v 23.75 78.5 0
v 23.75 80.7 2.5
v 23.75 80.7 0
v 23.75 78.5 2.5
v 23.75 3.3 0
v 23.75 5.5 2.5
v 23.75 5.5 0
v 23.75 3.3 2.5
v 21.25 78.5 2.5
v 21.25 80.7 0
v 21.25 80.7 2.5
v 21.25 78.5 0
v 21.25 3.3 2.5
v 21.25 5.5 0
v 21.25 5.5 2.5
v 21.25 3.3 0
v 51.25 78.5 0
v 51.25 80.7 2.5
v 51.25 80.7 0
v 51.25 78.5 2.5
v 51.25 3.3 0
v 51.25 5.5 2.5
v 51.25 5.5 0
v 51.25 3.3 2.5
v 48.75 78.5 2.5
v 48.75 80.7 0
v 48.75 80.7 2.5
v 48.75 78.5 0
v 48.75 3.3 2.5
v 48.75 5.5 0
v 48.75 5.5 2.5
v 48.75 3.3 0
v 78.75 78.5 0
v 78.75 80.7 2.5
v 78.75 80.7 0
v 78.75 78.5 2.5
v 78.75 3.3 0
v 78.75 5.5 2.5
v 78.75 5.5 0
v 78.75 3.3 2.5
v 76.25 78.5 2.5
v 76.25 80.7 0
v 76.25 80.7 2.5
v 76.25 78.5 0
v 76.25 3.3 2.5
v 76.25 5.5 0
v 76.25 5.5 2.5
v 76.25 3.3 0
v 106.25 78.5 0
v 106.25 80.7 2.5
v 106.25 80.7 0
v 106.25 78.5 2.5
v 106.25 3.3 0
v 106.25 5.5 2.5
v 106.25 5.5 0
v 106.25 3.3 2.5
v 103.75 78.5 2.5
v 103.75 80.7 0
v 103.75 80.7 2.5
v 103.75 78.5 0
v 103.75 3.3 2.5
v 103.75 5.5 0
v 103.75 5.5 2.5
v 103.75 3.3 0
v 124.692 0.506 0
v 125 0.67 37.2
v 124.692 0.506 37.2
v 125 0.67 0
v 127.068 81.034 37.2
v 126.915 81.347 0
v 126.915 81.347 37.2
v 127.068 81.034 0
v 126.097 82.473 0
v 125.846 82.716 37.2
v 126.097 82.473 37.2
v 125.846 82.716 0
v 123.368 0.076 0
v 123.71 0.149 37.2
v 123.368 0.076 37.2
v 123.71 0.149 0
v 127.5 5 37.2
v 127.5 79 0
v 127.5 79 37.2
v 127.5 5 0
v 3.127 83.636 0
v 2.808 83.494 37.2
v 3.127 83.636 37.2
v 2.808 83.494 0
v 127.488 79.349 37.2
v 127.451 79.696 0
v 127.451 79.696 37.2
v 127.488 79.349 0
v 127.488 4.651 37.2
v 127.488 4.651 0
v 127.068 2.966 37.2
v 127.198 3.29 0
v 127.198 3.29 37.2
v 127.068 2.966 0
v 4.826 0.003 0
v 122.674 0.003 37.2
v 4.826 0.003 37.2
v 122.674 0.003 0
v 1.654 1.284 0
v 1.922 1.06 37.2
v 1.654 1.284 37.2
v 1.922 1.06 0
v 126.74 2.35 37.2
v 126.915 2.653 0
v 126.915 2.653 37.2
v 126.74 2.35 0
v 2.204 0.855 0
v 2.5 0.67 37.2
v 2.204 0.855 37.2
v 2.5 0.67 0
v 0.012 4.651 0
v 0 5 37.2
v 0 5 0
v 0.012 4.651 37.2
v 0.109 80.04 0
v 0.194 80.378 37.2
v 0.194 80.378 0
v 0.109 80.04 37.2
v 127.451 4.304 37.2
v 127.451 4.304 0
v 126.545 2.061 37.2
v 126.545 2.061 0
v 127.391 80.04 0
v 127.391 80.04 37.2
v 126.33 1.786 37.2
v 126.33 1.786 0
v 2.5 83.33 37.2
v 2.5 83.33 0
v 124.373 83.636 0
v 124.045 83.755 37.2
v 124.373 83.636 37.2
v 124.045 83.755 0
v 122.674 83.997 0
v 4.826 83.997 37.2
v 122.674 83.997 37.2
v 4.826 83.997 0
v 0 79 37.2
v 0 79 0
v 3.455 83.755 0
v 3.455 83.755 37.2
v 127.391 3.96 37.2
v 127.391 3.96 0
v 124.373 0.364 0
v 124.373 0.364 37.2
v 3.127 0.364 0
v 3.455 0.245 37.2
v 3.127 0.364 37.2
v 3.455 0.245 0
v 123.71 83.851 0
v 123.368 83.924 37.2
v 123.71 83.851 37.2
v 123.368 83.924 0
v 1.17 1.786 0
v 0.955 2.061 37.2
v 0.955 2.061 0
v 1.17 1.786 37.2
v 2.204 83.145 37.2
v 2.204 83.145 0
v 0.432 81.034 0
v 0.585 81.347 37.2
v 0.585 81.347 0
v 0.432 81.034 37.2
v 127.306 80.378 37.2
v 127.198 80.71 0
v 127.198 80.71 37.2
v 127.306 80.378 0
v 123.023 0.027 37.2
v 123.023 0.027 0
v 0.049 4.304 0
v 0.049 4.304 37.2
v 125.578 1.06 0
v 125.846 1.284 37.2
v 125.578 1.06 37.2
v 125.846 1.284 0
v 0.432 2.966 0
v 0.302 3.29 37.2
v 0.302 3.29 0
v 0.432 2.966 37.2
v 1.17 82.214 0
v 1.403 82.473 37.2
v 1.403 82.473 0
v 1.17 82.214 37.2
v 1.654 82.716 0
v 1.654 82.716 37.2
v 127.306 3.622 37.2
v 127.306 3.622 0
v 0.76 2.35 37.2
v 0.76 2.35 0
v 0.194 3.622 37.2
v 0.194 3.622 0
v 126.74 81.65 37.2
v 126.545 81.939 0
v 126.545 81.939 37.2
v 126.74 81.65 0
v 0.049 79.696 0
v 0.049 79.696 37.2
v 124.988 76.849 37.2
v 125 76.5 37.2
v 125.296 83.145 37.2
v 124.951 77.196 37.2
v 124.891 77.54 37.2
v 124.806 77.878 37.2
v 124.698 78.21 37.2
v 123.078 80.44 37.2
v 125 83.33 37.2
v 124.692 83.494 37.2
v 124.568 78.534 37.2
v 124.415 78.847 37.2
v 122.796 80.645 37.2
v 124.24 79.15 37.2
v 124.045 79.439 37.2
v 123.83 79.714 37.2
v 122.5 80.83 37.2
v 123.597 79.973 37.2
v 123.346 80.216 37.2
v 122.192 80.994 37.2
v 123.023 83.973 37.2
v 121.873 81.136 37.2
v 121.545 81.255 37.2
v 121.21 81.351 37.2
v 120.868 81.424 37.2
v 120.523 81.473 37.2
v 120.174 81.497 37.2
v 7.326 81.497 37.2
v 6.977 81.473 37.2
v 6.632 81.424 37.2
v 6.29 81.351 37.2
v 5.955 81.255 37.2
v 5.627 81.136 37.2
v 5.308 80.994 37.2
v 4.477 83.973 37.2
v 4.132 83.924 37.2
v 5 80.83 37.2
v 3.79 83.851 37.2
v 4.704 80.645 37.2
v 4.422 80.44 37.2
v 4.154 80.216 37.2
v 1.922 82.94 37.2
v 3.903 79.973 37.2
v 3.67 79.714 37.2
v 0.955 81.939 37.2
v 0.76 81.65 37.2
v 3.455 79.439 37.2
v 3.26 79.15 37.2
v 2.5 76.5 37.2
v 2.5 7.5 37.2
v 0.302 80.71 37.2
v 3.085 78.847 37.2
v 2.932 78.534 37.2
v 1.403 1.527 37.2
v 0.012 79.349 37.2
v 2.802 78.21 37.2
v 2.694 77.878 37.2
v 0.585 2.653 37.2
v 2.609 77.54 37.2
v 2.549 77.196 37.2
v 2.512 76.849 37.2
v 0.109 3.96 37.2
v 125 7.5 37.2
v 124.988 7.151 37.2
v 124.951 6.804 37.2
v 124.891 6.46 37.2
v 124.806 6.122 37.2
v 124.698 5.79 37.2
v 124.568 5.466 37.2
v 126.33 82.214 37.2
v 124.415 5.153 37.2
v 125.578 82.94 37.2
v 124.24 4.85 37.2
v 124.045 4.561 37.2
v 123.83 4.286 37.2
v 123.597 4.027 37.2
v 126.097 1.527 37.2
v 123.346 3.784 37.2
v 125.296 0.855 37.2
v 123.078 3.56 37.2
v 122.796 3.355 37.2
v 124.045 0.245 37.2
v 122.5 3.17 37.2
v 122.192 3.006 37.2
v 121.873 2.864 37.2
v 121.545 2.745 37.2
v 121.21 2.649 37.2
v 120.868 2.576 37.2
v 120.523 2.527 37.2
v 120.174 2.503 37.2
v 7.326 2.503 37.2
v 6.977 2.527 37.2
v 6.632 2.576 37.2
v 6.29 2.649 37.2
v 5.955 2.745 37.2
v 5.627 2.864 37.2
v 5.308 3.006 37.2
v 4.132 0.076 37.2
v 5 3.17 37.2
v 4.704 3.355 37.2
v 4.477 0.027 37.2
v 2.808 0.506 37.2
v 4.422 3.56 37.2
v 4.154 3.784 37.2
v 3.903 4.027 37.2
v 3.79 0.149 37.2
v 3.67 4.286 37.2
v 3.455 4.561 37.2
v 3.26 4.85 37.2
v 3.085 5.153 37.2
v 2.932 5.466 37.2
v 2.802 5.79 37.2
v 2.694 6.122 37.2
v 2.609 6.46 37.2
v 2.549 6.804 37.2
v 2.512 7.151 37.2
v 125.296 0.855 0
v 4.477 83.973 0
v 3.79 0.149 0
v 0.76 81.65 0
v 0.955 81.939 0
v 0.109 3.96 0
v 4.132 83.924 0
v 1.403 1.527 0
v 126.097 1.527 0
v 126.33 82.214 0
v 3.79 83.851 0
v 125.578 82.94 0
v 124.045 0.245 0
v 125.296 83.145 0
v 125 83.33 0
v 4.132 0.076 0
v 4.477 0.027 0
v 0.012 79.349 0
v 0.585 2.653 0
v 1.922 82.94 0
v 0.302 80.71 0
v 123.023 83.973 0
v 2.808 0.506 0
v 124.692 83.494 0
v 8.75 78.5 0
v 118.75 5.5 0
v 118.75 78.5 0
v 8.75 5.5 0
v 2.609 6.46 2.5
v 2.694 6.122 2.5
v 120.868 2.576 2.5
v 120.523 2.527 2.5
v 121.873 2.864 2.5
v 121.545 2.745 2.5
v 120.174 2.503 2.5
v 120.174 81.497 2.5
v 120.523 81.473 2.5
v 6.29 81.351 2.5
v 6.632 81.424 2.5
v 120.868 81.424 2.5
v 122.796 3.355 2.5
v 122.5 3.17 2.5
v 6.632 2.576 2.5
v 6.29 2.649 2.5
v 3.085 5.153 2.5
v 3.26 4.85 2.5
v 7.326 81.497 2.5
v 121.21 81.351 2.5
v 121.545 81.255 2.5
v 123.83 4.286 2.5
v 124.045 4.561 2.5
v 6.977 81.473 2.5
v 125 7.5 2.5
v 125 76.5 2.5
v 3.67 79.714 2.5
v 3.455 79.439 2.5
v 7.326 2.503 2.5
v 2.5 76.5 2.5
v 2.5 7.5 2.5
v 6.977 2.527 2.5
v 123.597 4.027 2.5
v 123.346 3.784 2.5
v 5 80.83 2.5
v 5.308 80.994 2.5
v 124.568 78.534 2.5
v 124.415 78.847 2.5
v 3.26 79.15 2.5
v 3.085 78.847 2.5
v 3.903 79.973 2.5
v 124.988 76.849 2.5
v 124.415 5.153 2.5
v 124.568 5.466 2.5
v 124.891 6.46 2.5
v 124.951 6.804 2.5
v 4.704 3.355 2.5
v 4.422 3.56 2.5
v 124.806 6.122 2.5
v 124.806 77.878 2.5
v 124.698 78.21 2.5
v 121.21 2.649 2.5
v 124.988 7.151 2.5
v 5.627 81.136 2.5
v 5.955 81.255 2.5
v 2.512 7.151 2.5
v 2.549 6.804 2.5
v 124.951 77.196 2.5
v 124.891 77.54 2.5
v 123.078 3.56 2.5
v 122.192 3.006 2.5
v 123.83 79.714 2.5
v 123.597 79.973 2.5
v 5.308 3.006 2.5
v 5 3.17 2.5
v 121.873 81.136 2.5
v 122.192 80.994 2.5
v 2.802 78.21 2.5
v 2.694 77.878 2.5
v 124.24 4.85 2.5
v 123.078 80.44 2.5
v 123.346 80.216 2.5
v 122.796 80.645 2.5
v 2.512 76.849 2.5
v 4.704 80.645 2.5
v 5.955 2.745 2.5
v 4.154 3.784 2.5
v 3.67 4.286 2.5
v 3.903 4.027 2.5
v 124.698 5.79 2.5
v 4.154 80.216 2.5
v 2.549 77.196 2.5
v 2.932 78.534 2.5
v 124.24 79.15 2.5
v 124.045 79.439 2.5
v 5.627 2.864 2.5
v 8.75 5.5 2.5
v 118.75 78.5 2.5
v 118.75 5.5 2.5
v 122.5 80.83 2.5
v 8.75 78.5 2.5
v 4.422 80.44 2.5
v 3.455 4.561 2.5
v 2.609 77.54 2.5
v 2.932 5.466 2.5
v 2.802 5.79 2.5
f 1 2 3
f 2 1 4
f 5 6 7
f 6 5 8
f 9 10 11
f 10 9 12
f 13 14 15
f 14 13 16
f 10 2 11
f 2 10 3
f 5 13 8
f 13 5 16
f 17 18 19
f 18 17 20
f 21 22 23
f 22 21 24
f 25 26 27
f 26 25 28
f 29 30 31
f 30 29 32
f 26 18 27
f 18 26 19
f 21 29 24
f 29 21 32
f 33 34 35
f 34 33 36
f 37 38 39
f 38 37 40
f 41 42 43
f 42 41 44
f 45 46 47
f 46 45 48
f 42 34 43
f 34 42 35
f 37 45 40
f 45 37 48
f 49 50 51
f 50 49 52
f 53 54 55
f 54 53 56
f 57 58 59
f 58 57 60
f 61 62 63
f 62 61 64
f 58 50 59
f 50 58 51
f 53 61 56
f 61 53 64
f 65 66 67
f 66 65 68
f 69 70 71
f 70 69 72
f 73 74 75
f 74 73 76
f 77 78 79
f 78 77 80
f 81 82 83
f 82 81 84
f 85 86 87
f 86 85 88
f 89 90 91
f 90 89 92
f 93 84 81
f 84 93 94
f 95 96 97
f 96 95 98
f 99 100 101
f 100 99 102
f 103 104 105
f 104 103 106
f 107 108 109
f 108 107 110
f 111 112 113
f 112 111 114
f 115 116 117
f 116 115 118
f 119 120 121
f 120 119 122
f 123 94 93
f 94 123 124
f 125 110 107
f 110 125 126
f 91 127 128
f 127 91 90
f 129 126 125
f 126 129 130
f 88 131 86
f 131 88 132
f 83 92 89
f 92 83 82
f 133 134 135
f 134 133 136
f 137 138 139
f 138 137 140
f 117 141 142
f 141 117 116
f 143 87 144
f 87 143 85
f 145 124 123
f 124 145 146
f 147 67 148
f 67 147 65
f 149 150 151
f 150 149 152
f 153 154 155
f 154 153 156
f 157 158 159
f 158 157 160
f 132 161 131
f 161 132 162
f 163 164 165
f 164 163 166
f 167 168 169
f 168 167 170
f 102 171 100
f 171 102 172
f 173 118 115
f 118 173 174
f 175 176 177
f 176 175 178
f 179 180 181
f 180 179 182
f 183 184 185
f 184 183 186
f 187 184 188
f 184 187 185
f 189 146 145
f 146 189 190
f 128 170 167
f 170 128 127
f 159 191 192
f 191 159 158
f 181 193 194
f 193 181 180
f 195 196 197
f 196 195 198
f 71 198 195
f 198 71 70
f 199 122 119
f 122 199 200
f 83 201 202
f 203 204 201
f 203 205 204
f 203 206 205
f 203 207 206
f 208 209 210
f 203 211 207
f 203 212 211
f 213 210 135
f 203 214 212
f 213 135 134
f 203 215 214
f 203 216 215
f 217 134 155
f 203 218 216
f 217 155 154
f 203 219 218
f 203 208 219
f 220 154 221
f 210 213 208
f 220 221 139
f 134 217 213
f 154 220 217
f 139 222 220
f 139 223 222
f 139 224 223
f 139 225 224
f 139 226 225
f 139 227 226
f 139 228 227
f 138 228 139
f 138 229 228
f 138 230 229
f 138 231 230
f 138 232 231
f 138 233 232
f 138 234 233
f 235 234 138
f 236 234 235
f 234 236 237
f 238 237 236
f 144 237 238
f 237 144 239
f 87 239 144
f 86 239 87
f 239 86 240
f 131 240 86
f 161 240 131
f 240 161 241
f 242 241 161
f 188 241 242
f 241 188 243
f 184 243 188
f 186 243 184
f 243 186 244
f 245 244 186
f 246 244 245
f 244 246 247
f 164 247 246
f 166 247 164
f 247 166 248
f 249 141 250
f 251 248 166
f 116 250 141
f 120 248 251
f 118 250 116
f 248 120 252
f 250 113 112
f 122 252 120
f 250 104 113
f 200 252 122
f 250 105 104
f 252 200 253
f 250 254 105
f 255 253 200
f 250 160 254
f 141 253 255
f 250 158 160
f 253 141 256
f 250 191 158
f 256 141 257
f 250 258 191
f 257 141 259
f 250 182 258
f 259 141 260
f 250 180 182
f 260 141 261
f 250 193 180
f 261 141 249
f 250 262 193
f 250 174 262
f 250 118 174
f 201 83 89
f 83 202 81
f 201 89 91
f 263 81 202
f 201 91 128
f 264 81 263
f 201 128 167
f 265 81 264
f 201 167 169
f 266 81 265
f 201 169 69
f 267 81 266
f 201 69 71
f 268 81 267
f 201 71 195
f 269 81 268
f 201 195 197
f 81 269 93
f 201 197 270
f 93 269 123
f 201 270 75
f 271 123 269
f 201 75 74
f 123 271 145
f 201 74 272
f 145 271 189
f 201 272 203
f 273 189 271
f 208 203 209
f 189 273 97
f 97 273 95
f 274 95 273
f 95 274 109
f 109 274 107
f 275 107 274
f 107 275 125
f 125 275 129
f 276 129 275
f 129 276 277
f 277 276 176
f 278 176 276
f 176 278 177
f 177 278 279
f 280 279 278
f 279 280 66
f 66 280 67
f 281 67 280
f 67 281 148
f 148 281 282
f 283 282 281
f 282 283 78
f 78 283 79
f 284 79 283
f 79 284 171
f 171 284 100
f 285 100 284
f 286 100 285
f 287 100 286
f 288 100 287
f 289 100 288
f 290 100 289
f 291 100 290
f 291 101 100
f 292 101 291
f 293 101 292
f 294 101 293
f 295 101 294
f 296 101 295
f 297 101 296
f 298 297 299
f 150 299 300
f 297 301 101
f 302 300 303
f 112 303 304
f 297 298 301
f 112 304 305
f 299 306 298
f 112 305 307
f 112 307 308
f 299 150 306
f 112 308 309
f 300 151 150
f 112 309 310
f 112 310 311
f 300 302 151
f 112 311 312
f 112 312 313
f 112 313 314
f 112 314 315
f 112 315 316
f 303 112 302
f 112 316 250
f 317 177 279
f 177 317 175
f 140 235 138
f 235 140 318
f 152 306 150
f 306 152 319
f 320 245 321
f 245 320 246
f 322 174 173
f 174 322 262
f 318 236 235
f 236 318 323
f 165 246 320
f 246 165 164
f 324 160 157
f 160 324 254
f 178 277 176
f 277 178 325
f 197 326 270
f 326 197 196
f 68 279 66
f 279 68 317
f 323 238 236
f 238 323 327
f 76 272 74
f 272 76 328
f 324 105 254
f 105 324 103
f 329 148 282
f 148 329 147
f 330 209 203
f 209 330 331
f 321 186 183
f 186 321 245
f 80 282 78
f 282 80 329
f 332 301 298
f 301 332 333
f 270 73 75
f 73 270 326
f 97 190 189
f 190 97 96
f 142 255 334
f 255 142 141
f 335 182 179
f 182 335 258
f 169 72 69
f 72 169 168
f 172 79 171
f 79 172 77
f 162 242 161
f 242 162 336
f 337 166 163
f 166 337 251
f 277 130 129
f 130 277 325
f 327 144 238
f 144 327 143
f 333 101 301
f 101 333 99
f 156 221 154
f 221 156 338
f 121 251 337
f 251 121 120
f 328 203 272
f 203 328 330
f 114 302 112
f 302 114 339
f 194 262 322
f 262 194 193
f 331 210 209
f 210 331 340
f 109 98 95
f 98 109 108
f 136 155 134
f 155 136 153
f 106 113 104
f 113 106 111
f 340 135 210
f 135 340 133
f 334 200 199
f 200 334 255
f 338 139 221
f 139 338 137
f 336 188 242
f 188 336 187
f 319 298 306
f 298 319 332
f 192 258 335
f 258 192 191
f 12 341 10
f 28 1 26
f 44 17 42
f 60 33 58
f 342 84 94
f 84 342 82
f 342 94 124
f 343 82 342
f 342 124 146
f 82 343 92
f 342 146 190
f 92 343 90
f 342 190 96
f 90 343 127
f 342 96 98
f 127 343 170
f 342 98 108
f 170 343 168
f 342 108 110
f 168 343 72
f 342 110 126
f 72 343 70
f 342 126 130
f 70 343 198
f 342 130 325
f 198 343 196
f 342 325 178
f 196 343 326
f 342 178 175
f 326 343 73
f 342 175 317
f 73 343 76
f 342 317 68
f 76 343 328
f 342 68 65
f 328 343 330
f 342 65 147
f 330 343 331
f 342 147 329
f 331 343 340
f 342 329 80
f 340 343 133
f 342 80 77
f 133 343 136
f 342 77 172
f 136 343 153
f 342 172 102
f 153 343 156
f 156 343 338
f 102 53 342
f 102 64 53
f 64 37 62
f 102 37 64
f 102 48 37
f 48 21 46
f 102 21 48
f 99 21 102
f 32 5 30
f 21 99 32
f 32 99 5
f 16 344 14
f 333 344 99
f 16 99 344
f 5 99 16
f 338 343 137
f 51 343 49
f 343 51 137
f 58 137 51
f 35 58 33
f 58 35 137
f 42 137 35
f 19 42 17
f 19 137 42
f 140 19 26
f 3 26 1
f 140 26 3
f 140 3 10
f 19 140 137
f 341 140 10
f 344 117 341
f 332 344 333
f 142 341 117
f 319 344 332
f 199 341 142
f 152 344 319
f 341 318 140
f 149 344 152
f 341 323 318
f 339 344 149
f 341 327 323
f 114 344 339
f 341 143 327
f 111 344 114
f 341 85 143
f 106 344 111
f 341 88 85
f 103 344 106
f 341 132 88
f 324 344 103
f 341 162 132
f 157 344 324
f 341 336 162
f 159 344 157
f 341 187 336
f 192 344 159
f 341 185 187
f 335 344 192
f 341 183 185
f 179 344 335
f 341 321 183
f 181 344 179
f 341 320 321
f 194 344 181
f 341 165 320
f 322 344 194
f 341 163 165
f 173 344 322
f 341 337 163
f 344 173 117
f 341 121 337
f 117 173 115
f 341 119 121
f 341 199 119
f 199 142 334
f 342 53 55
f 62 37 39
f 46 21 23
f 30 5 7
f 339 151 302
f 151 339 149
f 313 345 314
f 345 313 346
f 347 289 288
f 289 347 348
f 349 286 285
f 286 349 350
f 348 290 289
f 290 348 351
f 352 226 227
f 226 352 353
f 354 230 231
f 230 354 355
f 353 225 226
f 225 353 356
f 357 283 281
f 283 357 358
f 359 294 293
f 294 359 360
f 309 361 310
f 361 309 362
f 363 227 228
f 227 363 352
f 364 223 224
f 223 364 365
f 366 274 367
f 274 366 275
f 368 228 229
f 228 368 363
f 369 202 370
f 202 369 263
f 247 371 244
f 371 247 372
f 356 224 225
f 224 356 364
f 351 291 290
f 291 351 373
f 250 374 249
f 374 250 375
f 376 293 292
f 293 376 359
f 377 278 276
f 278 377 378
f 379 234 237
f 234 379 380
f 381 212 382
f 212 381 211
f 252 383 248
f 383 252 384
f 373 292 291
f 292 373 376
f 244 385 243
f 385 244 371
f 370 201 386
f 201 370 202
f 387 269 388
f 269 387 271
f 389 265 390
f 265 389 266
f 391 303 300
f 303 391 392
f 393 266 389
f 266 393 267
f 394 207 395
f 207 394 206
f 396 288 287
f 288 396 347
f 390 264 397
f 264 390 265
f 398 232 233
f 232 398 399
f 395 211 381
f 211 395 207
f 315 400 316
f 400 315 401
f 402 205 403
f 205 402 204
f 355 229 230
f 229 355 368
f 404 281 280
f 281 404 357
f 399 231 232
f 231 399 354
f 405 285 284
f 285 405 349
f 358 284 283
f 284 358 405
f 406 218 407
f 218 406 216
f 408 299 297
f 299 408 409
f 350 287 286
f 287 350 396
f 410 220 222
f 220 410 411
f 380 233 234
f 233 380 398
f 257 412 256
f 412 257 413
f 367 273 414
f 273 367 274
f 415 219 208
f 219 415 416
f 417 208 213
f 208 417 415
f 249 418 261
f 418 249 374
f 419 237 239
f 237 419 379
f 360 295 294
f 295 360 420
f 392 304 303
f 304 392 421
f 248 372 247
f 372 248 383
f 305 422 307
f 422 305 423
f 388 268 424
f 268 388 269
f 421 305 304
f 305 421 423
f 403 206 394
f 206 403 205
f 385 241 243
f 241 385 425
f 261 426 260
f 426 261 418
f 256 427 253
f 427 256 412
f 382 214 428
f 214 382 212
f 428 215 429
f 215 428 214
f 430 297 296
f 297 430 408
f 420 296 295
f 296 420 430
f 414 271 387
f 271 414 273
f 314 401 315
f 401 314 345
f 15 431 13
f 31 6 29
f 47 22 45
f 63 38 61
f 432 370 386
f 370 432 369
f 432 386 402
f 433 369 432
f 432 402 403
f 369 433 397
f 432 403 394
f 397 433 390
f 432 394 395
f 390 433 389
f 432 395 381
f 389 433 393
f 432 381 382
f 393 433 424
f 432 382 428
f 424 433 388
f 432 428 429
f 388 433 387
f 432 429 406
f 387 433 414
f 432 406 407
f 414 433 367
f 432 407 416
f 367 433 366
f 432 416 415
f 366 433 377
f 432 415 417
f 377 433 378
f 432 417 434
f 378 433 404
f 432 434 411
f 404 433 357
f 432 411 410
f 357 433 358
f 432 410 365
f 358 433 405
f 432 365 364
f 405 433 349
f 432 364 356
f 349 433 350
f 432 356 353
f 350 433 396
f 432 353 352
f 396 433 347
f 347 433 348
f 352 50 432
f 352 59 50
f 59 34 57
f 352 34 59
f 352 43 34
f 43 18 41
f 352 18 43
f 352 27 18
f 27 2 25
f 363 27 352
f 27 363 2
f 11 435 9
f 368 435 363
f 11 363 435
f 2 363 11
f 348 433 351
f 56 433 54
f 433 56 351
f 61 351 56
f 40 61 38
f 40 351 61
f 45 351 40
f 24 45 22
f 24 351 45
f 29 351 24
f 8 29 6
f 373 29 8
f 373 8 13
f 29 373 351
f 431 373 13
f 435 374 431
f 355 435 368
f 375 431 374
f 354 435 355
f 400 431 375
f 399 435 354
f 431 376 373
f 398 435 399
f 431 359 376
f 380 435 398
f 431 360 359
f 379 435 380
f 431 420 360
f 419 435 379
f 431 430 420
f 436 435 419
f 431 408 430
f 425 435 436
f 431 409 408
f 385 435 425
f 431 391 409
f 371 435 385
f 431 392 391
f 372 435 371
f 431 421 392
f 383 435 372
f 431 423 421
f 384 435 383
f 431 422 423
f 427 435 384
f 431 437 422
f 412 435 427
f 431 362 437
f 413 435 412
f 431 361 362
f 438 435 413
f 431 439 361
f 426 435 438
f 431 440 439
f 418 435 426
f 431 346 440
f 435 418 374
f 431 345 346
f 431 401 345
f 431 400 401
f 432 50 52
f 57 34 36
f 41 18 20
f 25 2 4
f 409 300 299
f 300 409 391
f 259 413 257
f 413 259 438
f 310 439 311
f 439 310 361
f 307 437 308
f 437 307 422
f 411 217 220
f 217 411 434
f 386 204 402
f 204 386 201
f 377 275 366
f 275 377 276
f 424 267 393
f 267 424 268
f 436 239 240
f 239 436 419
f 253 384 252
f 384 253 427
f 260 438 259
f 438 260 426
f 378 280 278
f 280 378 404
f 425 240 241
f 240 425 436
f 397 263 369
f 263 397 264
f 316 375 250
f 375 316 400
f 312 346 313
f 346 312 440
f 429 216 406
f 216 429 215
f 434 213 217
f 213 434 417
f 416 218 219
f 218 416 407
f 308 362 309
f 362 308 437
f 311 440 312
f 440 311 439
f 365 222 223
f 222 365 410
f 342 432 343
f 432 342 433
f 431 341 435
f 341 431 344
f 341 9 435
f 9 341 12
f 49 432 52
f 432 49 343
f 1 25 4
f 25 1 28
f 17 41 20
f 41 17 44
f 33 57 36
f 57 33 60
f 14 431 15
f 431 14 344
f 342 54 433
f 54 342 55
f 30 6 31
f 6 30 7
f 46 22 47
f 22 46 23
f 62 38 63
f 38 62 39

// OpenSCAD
// file: round_corners.scad
module round_cube (x=40,y=30,z=2,d=10)
{
    A = x-d;
    B = y-d;
    C = z;
    
    translate([d/2,d/2,0])
    hull()
    {
        cylinder(d=d, h=C);
        translate([A,0,0]) cylinder(d=d, h=C);
        translate([A,B,0]) cylinder(d=d, h=C);
        translate([0,B,0]) cylinder(d=d, h=C);
    }
    
    
}

round_cube();

$fn = 90;
module box (x=82,y=154,z=52,d=20,t=2)
{
    A = x-d;
    B = y-d;
    C = z;
    
    //%translate([-d/2,-d/2,0]) cube([x,y,z]);
    difference()
    {
        hull()
        {
            cylinder(d=d, h=C);
            translate([A,0,0]) cylinder(d=d, h=C);
            translate([A,B,0]) cylinder(d=d, h=C);
            translate([0,B,0]) cylinder(d=d, h=C);
        }
        
        translate([-t/2,-t/2,t])
        hull()
        {
            translate([t,t,0]) cylinder(d=d-t, h=C);
            translate([A,t,0]) cylinder(d=d-t, h=C);
            translate([A,B,0]) cylinder(d=d-t, h=C);
            translate([t,B,0]) cylinder(d=d-t, h=C);
        }
    }
}

//box();
// main file
use<round_corners.scad>;

eps = 0.01;

// main parameters
// holder outer dimensions
h_x = 127.5;
h_y = 84;
h_z = 37.2;

// wall thickness
wt = 2.5;

// bath hole parameters
bh_x = 110;
bh_y = 73;
// bath hole peaks parameters
bhp_x = 2.5;
bhp_y = 2.2;
bhp_off = 25;

module bath_holder()
{
    difference()
    {
        // basic shape
        //cube([h_x, h_y, h_z]);
        round_cube(x=h_x,y=h_y,z=h_z,d=10);
        
        // main inner hole
        translate([wt,wt,wt])
            //cube([h_x-2*wt, h_y-2*wt, h_z-wt+eps]);
            round_cube(x=h_x-2*wt,y=h_y-2*wt,z=h_z-wt+eps,d=10);
        // main holes for baths
        mhx_o = (h_x-bh_x)/2;
        mhy_o = (h_y-bh_y)/2;
        translate([mhx_o,mhy_o,-eps]) cube([bh_x, bh_y, wt+2*eps]);
        // peak holes
        for(i=[0:3])
        {
            xi_o = mhx_o+bhp_off/2 + i*(bhp_off+bhp_x);
            yi_o = mhy_o-bhp_y;
            zi_o = -eps;
            xi = bhp_x;
            yi = bh_y + 2*bhp_y; 
            zi = wt + 2*eps;
            translate([xi_o, yi_o, zi_o]) cube([xi, yi, zi]);
        }
    }
}

bath_holder();
